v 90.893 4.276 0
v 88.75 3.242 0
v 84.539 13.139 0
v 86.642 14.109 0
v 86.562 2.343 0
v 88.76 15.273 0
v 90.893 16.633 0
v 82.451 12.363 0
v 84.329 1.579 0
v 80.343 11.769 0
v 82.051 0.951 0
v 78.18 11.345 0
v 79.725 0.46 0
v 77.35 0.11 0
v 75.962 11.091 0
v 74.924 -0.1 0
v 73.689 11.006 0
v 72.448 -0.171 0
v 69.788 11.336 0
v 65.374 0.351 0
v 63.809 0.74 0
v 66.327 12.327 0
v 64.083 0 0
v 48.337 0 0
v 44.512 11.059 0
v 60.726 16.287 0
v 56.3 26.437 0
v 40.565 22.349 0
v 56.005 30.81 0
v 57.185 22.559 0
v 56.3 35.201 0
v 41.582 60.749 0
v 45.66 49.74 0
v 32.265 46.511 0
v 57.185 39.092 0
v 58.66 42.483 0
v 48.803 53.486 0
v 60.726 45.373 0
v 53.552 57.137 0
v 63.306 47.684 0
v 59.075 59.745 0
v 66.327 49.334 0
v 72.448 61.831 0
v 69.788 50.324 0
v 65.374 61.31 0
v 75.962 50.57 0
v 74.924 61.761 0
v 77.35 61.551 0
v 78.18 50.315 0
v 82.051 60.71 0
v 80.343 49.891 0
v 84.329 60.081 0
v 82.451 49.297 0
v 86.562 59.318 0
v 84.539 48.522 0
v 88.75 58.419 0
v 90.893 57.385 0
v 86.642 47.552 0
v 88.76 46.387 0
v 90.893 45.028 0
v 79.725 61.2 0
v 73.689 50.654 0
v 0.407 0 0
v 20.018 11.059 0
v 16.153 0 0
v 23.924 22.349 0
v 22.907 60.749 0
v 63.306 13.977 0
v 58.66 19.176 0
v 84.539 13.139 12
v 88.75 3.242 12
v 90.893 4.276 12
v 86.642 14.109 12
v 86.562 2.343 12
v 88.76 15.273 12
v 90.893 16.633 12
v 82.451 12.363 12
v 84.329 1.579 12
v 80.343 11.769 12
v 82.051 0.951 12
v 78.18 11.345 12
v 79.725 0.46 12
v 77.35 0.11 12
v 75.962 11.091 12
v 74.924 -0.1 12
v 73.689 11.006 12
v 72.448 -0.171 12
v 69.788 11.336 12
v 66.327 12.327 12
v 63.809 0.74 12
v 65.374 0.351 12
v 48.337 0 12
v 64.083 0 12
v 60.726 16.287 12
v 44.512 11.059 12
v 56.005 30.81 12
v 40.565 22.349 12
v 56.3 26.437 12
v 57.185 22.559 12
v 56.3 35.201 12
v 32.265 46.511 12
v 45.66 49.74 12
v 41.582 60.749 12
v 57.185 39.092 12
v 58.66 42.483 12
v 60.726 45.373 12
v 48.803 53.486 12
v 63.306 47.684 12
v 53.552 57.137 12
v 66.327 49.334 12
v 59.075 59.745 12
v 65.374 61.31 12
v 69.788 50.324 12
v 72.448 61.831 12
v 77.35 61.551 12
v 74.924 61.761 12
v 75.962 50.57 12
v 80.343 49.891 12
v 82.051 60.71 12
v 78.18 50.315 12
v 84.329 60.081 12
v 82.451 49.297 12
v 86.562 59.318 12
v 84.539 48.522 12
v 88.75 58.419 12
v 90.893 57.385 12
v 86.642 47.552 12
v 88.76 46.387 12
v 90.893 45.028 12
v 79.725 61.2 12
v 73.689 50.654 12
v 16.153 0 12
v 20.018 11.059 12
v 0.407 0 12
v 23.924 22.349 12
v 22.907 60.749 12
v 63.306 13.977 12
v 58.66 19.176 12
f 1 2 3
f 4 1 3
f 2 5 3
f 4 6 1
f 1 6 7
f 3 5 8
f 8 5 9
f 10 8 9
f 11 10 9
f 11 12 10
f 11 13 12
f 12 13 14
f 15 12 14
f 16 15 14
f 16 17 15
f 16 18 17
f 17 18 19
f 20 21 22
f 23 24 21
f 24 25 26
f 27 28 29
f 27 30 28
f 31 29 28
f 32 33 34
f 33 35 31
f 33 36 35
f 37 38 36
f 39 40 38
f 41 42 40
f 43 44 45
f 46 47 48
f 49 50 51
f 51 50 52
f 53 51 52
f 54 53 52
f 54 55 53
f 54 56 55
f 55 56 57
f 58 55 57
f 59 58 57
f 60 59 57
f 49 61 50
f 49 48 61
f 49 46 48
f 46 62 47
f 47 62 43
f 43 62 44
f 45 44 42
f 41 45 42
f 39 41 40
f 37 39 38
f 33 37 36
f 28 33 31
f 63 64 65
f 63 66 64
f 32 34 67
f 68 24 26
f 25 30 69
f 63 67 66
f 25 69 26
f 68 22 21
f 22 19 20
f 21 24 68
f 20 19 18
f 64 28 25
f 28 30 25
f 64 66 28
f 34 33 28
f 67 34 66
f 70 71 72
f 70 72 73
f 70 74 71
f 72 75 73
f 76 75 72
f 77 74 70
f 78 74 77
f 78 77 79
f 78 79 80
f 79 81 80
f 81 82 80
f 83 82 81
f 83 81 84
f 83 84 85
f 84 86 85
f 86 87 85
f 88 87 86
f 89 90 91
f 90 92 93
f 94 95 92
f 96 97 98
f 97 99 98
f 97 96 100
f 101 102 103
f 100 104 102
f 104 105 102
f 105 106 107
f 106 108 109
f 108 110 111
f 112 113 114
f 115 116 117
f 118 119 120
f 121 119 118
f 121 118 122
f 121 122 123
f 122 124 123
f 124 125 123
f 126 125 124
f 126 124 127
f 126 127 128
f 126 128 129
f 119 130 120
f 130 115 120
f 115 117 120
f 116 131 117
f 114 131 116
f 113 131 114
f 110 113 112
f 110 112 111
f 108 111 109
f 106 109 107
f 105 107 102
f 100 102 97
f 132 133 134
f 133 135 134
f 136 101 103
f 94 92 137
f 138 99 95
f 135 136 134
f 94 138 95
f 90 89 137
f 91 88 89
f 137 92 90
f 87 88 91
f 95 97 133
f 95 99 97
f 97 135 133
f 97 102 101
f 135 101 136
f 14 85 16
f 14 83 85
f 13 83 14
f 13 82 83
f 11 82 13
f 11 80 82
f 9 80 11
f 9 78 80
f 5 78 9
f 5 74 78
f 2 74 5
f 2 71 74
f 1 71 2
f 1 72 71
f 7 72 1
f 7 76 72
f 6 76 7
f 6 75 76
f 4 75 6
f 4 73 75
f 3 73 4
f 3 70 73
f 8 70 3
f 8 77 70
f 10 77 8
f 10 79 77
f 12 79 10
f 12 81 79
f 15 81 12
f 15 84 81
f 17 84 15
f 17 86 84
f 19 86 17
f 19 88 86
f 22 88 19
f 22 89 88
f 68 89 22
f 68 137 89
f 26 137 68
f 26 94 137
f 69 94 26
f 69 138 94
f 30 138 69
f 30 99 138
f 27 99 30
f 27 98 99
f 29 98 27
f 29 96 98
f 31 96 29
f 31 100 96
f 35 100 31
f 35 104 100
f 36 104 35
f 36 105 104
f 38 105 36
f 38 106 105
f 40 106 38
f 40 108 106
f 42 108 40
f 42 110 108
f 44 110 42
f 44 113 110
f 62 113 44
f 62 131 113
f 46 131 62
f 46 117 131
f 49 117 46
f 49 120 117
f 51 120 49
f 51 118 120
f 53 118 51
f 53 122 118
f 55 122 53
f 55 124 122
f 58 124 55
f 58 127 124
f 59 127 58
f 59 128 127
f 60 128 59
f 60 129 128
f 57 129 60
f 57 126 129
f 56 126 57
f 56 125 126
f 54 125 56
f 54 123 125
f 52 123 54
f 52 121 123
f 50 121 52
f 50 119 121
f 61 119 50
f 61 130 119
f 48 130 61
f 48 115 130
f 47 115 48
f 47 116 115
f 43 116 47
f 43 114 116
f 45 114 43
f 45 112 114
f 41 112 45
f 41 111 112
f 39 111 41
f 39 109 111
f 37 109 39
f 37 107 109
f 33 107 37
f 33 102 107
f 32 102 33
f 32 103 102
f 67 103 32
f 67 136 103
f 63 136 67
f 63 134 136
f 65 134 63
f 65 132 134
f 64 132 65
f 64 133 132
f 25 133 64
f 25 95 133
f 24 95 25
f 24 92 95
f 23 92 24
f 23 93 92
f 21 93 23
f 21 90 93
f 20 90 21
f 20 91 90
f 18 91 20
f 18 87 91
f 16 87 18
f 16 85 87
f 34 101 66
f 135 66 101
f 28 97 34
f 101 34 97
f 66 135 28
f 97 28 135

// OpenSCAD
linear_extrude( 12 ) {
    union() {
        text( "A", 60, "DejaVu Sans:style=Bold" );

        translate( [36, 1, 0 ] ) {
            text( "C", 59, "DejaVu Sans:style=Bold" );
        }
    }
}
